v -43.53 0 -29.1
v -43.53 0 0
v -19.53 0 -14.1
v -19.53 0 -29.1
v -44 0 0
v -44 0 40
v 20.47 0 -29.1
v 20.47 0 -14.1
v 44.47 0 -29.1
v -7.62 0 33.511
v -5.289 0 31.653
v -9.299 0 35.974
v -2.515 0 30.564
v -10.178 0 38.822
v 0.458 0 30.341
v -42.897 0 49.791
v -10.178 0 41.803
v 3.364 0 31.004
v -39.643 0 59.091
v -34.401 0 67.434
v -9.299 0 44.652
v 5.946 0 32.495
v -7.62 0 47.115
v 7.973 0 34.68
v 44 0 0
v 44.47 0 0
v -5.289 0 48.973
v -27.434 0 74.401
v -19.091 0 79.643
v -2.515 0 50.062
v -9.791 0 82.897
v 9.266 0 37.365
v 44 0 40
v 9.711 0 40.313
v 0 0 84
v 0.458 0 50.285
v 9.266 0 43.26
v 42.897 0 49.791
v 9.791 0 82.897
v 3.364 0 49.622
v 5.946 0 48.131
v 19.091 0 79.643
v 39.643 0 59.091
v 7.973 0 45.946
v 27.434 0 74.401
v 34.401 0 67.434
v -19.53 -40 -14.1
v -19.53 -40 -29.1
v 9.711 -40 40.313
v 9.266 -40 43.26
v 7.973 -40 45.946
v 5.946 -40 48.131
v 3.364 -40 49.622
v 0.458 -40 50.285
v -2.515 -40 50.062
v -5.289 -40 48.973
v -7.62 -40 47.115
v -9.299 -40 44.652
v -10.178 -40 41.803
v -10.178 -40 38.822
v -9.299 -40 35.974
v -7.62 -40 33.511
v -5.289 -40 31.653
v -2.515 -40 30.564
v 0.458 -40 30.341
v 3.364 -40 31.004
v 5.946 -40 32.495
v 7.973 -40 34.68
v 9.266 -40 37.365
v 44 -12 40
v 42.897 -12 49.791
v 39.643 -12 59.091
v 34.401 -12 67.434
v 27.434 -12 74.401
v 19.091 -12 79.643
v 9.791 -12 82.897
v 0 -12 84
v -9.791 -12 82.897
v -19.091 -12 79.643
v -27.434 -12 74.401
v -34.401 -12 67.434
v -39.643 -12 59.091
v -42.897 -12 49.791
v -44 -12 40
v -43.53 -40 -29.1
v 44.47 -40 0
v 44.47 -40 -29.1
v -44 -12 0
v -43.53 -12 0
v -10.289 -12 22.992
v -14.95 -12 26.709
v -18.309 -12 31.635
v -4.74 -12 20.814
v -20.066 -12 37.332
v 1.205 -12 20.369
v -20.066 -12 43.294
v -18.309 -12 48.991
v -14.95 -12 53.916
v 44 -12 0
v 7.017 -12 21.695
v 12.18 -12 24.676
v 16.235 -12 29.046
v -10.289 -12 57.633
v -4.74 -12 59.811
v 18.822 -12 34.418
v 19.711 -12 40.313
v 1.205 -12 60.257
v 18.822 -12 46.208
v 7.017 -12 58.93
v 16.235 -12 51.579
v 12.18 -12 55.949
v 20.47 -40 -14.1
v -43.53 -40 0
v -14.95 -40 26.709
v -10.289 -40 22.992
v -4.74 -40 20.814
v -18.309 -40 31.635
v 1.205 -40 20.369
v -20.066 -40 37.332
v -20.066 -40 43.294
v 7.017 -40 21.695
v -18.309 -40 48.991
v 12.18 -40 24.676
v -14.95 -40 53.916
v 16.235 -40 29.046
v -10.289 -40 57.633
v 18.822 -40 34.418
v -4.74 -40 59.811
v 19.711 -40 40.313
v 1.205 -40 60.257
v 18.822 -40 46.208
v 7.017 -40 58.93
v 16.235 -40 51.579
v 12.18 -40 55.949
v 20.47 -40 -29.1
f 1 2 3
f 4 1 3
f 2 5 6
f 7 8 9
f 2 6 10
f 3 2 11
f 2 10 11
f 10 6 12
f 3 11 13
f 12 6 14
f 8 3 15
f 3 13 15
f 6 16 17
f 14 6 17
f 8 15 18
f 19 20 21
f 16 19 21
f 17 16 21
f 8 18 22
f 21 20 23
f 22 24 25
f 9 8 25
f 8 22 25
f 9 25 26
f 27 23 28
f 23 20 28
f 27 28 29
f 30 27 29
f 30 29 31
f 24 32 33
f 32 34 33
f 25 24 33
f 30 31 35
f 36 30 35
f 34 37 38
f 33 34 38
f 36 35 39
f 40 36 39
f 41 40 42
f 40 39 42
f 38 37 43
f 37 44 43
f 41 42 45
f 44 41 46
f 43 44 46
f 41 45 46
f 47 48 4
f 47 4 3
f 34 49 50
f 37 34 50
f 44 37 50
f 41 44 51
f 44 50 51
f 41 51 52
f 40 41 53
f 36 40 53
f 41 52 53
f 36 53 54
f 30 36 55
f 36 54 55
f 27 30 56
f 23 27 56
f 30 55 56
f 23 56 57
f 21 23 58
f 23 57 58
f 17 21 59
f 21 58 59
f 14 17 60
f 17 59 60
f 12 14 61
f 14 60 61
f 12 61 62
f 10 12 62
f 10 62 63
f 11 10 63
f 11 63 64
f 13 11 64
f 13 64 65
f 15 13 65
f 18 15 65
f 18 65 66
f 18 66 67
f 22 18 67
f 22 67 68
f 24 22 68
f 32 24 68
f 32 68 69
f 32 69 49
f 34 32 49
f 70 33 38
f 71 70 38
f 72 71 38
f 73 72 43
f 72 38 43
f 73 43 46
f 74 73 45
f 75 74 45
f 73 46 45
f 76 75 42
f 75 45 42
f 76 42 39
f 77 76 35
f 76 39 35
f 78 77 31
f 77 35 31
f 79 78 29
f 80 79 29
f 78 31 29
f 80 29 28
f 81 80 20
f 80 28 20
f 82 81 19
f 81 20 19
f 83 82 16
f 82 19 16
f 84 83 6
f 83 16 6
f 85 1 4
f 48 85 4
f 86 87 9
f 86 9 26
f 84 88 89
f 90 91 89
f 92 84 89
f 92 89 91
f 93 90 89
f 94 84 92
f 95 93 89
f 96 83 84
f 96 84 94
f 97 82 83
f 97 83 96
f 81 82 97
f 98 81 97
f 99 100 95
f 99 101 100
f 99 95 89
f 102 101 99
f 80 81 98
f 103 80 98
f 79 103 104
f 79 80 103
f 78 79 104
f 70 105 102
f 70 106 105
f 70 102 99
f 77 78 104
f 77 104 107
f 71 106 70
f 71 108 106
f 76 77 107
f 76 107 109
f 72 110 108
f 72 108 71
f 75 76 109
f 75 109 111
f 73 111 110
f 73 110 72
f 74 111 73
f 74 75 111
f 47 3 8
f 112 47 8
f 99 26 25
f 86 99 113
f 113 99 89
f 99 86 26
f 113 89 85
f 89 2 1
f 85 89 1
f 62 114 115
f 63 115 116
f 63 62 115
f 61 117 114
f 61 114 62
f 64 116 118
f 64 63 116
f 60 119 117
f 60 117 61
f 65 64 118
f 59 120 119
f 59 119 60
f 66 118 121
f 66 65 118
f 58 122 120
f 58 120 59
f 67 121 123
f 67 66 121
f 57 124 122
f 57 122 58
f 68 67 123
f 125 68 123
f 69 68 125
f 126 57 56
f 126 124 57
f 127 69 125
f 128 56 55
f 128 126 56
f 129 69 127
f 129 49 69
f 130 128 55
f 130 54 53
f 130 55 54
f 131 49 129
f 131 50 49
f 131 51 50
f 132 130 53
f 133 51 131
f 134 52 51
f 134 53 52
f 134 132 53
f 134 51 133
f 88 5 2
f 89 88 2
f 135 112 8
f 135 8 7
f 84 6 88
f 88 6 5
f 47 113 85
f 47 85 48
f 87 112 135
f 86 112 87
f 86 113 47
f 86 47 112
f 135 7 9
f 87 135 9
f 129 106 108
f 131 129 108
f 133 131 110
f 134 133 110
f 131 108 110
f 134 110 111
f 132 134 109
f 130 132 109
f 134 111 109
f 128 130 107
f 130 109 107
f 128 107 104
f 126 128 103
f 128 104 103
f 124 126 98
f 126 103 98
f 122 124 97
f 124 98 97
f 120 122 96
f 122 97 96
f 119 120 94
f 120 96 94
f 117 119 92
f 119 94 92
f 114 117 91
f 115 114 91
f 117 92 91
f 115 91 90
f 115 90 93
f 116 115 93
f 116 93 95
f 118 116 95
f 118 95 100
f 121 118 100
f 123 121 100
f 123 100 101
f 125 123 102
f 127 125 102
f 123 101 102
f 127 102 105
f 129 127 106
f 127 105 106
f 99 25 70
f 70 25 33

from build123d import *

# Parameters (mm, degrees)
F1_DEPTH = 12
F2_R     = 20
F3_DEPTH = 28
F5_DEPTH = 40
F6_R     = 10
F7_DEPTH = 70


with BuildPart() as f1:
    # F0 (on Front) → F1 (new body)
    with BuildSketch(Plane.XZ):
        with BuildLine():
            Line((44, 0), (44, 40))
            ThreePointArc((44, 40), (0, 84), (-44, 40))
            Line((-44, 40), (-44, 0))
            Line((-44, 0), (44, 0))
        make_face()
    extrude(amount=F1_DEPTH)

    # F2 (on face) → F3 (join)
    with BuildSketch(Plane.XZ.offset(12)):
        with Locations((-0.289364, 40.312858)):
            Circle(F2_R)
    extrude(amount=F3_DEPTH)

    # F4 (on Front) → F5 (join)
    with BuildSketch(Plane.XZ):
        Polygon((44.469752, -29.099998), (44.469752, 0), (-43.530248, 0), (-43.530248, -29.099998), (-19.530248, -29.099998), (-19.530248, -14.099998), (20.469752, -14.099998), (20.469752, -29.099998), align=None)
    extrude(amount=F5_DEPTH)

    # F6 (on face) → F7 (cut)
    with BuildSketch(Plane.XZ.offset(40)):
        with Locations((-0.289364, 40.312858)):
            Circle(F6_R)
    extrude(amount=-F7_DEPTH, mode=Mode.SUBTRACT)


solid = f1.part
